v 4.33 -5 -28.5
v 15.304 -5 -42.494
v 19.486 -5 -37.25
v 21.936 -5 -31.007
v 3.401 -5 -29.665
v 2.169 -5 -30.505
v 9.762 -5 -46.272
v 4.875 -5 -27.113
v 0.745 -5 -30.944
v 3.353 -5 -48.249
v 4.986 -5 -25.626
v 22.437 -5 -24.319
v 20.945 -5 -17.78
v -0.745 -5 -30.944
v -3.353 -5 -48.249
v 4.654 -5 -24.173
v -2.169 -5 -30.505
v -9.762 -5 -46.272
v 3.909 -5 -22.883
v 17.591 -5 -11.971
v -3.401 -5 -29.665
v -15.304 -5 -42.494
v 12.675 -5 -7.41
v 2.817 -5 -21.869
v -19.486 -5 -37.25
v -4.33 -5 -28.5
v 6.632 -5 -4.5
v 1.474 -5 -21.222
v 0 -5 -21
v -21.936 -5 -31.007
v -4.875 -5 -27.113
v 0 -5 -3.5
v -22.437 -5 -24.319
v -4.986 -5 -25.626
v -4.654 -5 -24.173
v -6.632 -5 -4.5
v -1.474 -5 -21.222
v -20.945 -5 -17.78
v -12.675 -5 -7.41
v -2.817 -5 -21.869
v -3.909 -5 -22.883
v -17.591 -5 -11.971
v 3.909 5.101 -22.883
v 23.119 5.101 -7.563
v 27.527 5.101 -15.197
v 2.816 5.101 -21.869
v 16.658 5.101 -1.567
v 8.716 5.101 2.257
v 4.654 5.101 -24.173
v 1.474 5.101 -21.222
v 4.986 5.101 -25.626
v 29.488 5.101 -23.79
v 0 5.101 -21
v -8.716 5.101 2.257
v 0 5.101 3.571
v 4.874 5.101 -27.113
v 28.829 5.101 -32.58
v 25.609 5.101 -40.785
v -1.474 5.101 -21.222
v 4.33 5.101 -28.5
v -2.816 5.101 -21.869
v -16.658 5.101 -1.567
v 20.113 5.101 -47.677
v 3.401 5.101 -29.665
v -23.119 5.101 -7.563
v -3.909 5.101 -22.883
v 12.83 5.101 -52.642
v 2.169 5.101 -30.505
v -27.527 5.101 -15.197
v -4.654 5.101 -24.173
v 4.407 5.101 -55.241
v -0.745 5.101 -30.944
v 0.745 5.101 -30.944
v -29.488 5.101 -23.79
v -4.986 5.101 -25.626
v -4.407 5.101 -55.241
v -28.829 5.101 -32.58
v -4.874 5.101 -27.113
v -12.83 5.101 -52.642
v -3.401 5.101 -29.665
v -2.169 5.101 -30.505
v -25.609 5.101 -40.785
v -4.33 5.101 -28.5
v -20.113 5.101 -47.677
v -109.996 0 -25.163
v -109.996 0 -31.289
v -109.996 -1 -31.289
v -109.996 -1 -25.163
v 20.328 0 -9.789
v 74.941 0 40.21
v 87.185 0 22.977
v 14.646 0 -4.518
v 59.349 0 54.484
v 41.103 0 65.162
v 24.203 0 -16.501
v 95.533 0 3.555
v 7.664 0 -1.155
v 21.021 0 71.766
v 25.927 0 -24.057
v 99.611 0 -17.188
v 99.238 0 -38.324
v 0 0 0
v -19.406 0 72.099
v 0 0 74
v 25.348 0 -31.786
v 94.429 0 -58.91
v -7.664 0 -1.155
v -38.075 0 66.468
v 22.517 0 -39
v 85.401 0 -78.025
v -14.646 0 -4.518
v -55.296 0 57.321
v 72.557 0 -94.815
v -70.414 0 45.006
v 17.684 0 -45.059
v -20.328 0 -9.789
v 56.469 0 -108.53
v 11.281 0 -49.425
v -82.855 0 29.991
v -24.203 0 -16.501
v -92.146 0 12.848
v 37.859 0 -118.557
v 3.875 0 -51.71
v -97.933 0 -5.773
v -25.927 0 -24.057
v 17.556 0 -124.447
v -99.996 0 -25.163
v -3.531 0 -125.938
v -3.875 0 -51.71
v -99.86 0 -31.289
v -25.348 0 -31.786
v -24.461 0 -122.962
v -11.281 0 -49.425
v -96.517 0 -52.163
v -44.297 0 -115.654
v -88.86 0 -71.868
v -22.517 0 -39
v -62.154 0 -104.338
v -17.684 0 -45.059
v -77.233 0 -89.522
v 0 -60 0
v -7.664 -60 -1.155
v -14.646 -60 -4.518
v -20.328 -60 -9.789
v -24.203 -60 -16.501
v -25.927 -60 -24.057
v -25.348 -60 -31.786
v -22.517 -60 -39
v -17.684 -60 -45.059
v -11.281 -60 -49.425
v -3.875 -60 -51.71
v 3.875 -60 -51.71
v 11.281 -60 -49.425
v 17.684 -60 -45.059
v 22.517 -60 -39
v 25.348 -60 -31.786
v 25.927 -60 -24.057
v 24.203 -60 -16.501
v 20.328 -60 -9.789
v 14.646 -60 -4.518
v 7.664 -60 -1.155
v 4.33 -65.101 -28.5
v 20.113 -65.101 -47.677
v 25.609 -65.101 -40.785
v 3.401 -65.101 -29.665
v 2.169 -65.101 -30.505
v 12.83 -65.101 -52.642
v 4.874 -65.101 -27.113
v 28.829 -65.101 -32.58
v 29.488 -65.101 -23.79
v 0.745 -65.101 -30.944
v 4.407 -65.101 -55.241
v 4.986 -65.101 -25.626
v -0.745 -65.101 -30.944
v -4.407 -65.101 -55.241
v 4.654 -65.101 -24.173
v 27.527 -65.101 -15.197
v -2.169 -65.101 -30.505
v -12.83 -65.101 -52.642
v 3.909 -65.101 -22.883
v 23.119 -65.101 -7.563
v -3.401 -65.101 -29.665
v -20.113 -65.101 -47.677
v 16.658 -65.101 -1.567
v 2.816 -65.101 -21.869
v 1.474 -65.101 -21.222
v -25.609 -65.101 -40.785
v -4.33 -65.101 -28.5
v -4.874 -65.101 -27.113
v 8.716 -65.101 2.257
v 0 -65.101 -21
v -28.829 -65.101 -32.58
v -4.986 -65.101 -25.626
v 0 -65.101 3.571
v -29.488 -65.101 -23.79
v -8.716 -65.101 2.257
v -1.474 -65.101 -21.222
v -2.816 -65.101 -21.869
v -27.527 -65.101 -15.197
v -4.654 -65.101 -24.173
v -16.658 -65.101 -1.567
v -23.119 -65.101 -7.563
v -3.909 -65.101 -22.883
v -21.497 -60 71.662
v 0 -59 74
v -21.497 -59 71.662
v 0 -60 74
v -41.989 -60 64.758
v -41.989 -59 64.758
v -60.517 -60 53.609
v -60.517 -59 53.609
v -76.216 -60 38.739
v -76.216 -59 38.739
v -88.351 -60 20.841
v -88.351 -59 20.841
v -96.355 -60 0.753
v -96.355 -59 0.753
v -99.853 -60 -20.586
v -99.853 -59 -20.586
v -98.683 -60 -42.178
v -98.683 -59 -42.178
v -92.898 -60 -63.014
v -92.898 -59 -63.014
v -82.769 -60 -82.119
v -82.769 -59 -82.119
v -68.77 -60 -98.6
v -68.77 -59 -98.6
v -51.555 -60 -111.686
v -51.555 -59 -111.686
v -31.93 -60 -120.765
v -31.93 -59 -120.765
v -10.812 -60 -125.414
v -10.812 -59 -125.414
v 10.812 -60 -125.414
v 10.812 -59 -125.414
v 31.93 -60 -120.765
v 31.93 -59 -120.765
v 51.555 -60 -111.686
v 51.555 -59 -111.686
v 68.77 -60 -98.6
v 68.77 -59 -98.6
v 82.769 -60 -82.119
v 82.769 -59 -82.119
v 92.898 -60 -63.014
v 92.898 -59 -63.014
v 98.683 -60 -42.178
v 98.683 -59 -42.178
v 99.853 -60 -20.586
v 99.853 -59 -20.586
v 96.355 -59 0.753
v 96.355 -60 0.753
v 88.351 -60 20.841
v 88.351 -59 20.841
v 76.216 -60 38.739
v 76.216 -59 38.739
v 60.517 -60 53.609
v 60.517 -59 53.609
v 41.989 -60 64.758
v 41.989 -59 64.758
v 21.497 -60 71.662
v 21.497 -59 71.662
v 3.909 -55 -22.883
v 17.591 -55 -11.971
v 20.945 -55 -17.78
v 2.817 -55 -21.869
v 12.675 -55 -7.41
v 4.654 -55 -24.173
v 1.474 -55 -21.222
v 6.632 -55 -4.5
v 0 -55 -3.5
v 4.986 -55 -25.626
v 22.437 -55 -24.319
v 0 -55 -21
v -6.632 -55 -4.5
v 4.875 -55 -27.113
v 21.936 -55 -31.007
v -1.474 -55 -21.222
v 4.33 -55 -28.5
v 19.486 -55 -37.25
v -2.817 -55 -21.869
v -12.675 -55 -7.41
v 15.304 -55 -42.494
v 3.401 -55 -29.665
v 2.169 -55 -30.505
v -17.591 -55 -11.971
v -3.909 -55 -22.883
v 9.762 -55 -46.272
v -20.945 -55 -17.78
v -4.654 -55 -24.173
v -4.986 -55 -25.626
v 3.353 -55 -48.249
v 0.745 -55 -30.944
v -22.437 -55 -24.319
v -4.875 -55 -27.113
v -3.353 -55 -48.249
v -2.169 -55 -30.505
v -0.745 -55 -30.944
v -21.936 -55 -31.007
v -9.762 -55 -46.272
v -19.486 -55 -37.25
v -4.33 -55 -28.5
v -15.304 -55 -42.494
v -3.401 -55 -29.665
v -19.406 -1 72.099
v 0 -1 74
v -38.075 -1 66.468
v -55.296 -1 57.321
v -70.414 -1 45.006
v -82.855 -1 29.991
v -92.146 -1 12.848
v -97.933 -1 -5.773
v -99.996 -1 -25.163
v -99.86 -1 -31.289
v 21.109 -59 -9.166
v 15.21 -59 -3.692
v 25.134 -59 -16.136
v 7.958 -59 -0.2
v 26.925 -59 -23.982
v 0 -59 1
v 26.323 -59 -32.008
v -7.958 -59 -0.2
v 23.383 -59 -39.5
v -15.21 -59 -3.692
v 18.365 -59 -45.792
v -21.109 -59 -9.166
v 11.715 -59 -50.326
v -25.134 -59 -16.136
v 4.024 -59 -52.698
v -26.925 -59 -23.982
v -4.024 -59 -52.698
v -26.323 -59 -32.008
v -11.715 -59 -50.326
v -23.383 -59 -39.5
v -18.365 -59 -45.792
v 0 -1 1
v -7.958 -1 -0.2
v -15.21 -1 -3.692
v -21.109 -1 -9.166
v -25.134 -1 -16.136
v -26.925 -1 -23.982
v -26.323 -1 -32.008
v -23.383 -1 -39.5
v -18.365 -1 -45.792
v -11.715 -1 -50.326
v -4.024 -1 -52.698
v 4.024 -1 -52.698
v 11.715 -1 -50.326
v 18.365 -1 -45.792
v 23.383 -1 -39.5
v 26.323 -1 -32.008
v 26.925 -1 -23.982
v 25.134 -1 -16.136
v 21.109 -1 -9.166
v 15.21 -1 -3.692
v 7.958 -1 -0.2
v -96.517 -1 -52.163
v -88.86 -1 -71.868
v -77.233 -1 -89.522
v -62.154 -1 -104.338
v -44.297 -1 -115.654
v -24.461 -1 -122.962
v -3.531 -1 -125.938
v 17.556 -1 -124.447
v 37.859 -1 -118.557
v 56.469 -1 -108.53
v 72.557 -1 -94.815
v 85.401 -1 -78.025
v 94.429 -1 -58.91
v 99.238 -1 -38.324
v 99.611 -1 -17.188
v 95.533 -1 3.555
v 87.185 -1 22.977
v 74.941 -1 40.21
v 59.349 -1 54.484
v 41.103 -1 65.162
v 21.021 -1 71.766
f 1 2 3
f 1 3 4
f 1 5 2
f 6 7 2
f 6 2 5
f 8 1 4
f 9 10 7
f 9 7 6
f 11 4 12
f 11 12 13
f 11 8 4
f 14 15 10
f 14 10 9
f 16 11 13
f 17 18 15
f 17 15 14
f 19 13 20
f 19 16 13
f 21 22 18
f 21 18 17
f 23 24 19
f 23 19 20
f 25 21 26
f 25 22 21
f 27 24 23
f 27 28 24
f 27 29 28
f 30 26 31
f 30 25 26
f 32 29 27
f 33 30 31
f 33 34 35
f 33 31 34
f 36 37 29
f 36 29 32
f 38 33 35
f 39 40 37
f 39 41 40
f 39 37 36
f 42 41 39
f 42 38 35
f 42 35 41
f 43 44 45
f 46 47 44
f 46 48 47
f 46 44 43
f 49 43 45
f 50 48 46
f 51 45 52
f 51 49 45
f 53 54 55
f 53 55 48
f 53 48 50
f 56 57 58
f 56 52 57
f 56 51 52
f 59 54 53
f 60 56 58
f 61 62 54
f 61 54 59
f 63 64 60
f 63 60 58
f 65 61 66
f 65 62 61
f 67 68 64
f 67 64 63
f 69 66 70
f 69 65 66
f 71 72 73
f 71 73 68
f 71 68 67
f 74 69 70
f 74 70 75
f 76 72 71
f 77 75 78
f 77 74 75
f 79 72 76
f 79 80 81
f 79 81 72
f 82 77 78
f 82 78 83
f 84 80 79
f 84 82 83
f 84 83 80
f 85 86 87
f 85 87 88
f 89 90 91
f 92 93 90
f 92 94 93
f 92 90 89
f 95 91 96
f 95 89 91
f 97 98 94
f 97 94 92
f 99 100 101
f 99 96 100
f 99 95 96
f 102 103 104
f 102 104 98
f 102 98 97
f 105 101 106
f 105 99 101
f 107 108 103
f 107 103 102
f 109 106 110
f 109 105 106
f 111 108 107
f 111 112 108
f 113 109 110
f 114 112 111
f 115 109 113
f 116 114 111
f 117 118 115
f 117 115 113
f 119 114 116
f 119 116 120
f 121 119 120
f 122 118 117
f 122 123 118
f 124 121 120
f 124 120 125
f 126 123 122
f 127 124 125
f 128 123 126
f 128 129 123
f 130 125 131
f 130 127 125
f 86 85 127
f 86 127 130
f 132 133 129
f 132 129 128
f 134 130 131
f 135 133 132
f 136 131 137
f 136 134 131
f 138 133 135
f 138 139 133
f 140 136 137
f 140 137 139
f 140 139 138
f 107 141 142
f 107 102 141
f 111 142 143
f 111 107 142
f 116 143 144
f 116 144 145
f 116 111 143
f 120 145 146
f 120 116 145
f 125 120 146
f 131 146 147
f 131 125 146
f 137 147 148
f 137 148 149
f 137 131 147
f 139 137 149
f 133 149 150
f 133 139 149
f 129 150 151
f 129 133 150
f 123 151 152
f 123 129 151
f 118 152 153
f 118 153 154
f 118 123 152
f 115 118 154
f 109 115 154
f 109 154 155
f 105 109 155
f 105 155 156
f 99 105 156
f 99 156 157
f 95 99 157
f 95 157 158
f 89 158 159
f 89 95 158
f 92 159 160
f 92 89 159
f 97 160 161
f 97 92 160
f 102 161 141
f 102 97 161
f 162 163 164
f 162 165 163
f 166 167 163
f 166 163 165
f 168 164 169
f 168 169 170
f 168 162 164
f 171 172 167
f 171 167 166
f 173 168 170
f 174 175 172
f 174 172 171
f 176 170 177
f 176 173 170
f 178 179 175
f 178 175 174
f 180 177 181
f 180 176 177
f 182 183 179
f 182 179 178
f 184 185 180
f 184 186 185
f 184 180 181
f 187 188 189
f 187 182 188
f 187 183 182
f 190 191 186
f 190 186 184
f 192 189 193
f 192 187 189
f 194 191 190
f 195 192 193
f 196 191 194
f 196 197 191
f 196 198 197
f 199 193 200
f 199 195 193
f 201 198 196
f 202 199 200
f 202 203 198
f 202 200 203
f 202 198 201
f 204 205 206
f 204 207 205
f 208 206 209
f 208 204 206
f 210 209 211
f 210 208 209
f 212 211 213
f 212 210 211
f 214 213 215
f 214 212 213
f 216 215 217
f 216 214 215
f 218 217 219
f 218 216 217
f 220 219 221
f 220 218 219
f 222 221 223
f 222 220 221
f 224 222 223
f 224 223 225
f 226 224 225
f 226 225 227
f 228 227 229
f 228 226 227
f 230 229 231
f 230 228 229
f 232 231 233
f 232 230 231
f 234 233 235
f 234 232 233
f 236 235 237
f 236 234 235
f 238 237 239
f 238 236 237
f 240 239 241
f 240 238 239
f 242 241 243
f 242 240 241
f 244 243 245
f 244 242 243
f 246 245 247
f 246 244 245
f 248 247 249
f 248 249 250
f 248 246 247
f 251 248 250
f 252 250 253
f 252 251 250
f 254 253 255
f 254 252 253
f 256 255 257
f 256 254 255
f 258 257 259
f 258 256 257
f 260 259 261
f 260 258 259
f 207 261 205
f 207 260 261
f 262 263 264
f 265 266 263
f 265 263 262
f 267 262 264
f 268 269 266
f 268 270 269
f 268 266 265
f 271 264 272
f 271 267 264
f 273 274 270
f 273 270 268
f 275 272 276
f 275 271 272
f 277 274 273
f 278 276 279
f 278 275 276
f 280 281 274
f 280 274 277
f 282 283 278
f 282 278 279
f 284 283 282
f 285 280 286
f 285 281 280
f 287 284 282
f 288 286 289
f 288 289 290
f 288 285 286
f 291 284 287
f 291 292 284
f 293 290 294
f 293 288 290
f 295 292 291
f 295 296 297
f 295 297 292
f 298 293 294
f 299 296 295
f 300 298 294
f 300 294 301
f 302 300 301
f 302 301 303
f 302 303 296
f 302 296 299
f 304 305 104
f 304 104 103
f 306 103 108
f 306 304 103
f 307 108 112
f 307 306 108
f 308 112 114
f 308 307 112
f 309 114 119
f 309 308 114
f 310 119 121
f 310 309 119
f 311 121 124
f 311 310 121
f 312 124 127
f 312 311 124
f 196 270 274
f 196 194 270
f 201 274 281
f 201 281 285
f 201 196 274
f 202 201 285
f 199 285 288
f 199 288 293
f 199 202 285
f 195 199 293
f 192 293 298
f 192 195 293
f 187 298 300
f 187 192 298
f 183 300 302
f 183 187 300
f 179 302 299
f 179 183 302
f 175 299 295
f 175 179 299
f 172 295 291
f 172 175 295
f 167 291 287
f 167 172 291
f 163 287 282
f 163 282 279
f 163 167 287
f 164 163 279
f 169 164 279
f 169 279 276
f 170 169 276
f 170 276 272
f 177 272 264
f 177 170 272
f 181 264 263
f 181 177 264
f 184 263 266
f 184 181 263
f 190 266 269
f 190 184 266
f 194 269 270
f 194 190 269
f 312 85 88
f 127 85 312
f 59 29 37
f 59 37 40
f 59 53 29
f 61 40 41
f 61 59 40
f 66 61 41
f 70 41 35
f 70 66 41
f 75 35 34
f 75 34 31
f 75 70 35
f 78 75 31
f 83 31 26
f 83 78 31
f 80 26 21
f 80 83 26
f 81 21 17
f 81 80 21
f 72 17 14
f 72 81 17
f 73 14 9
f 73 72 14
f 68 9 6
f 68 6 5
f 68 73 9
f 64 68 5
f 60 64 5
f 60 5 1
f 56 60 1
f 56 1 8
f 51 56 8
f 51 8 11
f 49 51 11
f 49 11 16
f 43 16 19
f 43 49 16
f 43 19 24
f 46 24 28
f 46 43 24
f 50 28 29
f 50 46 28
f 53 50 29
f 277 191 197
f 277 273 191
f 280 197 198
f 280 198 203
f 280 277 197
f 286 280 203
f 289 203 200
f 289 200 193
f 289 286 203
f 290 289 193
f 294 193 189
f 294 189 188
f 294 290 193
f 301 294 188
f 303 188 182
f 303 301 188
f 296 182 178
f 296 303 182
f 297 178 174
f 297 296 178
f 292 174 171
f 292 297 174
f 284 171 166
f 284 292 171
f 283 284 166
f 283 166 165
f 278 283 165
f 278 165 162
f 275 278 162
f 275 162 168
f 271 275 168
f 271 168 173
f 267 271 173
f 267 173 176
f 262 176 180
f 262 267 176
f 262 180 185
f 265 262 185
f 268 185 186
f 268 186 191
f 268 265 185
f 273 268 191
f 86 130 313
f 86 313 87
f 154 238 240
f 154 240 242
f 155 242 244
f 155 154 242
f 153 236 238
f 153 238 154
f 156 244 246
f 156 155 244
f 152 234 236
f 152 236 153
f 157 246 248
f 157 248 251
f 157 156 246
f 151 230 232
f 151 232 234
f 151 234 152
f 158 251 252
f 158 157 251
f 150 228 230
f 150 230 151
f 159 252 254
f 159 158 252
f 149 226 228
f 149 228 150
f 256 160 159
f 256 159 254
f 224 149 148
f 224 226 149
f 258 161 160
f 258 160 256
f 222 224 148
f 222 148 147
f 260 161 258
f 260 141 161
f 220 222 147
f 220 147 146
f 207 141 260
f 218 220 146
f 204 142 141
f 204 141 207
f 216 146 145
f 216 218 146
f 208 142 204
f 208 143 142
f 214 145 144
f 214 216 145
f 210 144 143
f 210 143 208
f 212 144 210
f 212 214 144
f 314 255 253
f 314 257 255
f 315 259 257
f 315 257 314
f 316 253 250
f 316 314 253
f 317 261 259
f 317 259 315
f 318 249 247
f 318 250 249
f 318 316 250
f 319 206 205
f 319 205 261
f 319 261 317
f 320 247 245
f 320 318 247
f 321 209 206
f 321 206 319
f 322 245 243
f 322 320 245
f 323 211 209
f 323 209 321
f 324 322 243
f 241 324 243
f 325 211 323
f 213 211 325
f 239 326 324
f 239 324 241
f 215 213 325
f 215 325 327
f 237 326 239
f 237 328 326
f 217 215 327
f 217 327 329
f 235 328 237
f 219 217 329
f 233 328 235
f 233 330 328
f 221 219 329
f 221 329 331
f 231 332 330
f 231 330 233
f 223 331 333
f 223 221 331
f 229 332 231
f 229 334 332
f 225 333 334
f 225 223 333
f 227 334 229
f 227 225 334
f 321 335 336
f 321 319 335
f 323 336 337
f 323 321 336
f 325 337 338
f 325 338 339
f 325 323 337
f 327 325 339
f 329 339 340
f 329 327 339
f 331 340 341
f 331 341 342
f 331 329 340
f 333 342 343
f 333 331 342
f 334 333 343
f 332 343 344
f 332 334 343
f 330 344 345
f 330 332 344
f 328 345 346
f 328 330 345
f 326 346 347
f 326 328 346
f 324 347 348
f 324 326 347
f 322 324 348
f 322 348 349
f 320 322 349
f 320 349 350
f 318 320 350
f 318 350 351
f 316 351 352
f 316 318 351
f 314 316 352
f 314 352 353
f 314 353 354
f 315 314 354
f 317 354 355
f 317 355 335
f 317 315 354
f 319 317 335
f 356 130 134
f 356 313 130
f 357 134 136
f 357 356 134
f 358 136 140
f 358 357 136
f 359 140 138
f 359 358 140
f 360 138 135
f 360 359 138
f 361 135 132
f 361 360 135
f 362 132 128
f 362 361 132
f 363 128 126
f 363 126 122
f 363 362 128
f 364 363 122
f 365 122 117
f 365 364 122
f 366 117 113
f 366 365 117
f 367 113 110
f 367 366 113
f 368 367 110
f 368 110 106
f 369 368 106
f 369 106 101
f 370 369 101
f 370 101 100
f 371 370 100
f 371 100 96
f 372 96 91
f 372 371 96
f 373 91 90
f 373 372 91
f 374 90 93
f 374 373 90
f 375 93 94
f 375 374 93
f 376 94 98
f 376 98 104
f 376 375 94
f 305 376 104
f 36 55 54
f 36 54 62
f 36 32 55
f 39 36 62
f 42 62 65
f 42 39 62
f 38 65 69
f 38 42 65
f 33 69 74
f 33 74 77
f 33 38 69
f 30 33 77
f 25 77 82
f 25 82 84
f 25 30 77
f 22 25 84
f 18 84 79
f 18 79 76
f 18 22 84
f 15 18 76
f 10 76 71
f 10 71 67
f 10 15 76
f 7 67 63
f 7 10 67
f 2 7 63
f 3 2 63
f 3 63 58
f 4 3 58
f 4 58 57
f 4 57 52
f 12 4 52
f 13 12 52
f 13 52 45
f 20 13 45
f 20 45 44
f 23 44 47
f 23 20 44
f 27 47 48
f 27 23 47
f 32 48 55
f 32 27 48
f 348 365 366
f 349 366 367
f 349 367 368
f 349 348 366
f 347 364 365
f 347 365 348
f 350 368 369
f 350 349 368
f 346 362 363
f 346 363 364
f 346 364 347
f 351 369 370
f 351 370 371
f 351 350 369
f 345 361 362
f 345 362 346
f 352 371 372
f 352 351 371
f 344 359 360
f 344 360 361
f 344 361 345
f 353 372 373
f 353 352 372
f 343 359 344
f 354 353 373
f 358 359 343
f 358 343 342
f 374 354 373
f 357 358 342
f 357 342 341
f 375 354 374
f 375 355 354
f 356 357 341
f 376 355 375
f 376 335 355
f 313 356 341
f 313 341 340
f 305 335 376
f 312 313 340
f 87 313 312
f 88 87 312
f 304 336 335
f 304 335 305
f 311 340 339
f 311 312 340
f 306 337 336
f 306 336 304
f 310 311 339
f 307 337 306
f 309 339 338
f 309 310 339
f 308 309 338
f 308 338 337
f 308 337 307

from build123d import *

# Parameters (mm, degrees)
F4_DEPTH = 1


with BuildPart() as f1:
    # F0 (on Right) → F1 (revolve)
    with BuildSketch(Plane.YZ):
        Polygon((-59, 74), (-60, 74), (-60, 0), (0, 0), (0, 74), (-1, 74), (-1, 1), (-59, 1), align=None)
    revolve(axis=Axis((0, -30, -26), (0, -1, 0)))

    # F3 (on face) → F4 (join)
    with BuildSketch(Plane(origin=(0, 0, 0), x_dir=(-1, 0, 0), z_dir=(0, 1, 0))):
        with BuildLine():
            ThreePointArc((100, -26), (99.9650009685, -28.6454832021), (99.8600283726, -31.2891146171))
            Line((99.8600283726, -31.2891146171), (109.9964940565, -31.2891146171))
            Line((109.9964940565, -31.2891146171), (109.9964940565, -25.1626372337))
            Line((109.9964940565, -25.1626372337), (99.9964940565, -25.1626372337))
            ThreePointArc((99.9964940565, -25.1626372337), (99.9991235103, -25.5813149471), (100, -26))
        make_face()
    extrude(amount=-F4_DEPTH)


with BuildPart() as f2:
    # F0 (on Right) → F2 (revolve)
    with BuildSketch(Plane.YZ):
        Polygon((-55, -3.5), (-60, 0), (-65.10112958, 3.570790706), (-65.10112958, -21.000209294), (-55, -21), align=None)
        Polygon((-64.10112958, -20.0001885739), (-64.10112958, 1.6501351444), (-56, -4.0206555616), (-56, -20.0000207196), align=None, mode=Mode.SUBTRACT)
        Polygon((-56, -4.0206555616), (-64.10112958, 1.6501351444), (-64.10112958, -20.0001885739), (-56, -20.0000207196), align=None)
    revolve(axis=Axis((0, -30, -26), (0, -1, 0)))


with BuildPart() as f2b:
    # F0 (on Right) → F2, piece 2 (revolve)
    with BuildSketch(Plane.YZ):
        Polygon((5.10112958, 3.570790706), (0, 0), (-5, -3.5), (-5, -21), (5.10112958, -21.000209294), align=None)
        Polygon((-4, -20.0000207196), (-4, -4.0206555616), (4.10112958, 1.6501351444), (4.10112958, -20.0001885739), align=None, mode=Mode.SUBTRACT)
        Polygon((4.10112958, 1.6501351444), (-4, -4.0206555616), (-4, -20.0000207196), (4.10112958, -20.0001885739), align=None)
    revolve(axis=Axis((0, -30, -26), (0, -1, 0)))


solid = Compound([f1.part, f2.part, f2b.part])
